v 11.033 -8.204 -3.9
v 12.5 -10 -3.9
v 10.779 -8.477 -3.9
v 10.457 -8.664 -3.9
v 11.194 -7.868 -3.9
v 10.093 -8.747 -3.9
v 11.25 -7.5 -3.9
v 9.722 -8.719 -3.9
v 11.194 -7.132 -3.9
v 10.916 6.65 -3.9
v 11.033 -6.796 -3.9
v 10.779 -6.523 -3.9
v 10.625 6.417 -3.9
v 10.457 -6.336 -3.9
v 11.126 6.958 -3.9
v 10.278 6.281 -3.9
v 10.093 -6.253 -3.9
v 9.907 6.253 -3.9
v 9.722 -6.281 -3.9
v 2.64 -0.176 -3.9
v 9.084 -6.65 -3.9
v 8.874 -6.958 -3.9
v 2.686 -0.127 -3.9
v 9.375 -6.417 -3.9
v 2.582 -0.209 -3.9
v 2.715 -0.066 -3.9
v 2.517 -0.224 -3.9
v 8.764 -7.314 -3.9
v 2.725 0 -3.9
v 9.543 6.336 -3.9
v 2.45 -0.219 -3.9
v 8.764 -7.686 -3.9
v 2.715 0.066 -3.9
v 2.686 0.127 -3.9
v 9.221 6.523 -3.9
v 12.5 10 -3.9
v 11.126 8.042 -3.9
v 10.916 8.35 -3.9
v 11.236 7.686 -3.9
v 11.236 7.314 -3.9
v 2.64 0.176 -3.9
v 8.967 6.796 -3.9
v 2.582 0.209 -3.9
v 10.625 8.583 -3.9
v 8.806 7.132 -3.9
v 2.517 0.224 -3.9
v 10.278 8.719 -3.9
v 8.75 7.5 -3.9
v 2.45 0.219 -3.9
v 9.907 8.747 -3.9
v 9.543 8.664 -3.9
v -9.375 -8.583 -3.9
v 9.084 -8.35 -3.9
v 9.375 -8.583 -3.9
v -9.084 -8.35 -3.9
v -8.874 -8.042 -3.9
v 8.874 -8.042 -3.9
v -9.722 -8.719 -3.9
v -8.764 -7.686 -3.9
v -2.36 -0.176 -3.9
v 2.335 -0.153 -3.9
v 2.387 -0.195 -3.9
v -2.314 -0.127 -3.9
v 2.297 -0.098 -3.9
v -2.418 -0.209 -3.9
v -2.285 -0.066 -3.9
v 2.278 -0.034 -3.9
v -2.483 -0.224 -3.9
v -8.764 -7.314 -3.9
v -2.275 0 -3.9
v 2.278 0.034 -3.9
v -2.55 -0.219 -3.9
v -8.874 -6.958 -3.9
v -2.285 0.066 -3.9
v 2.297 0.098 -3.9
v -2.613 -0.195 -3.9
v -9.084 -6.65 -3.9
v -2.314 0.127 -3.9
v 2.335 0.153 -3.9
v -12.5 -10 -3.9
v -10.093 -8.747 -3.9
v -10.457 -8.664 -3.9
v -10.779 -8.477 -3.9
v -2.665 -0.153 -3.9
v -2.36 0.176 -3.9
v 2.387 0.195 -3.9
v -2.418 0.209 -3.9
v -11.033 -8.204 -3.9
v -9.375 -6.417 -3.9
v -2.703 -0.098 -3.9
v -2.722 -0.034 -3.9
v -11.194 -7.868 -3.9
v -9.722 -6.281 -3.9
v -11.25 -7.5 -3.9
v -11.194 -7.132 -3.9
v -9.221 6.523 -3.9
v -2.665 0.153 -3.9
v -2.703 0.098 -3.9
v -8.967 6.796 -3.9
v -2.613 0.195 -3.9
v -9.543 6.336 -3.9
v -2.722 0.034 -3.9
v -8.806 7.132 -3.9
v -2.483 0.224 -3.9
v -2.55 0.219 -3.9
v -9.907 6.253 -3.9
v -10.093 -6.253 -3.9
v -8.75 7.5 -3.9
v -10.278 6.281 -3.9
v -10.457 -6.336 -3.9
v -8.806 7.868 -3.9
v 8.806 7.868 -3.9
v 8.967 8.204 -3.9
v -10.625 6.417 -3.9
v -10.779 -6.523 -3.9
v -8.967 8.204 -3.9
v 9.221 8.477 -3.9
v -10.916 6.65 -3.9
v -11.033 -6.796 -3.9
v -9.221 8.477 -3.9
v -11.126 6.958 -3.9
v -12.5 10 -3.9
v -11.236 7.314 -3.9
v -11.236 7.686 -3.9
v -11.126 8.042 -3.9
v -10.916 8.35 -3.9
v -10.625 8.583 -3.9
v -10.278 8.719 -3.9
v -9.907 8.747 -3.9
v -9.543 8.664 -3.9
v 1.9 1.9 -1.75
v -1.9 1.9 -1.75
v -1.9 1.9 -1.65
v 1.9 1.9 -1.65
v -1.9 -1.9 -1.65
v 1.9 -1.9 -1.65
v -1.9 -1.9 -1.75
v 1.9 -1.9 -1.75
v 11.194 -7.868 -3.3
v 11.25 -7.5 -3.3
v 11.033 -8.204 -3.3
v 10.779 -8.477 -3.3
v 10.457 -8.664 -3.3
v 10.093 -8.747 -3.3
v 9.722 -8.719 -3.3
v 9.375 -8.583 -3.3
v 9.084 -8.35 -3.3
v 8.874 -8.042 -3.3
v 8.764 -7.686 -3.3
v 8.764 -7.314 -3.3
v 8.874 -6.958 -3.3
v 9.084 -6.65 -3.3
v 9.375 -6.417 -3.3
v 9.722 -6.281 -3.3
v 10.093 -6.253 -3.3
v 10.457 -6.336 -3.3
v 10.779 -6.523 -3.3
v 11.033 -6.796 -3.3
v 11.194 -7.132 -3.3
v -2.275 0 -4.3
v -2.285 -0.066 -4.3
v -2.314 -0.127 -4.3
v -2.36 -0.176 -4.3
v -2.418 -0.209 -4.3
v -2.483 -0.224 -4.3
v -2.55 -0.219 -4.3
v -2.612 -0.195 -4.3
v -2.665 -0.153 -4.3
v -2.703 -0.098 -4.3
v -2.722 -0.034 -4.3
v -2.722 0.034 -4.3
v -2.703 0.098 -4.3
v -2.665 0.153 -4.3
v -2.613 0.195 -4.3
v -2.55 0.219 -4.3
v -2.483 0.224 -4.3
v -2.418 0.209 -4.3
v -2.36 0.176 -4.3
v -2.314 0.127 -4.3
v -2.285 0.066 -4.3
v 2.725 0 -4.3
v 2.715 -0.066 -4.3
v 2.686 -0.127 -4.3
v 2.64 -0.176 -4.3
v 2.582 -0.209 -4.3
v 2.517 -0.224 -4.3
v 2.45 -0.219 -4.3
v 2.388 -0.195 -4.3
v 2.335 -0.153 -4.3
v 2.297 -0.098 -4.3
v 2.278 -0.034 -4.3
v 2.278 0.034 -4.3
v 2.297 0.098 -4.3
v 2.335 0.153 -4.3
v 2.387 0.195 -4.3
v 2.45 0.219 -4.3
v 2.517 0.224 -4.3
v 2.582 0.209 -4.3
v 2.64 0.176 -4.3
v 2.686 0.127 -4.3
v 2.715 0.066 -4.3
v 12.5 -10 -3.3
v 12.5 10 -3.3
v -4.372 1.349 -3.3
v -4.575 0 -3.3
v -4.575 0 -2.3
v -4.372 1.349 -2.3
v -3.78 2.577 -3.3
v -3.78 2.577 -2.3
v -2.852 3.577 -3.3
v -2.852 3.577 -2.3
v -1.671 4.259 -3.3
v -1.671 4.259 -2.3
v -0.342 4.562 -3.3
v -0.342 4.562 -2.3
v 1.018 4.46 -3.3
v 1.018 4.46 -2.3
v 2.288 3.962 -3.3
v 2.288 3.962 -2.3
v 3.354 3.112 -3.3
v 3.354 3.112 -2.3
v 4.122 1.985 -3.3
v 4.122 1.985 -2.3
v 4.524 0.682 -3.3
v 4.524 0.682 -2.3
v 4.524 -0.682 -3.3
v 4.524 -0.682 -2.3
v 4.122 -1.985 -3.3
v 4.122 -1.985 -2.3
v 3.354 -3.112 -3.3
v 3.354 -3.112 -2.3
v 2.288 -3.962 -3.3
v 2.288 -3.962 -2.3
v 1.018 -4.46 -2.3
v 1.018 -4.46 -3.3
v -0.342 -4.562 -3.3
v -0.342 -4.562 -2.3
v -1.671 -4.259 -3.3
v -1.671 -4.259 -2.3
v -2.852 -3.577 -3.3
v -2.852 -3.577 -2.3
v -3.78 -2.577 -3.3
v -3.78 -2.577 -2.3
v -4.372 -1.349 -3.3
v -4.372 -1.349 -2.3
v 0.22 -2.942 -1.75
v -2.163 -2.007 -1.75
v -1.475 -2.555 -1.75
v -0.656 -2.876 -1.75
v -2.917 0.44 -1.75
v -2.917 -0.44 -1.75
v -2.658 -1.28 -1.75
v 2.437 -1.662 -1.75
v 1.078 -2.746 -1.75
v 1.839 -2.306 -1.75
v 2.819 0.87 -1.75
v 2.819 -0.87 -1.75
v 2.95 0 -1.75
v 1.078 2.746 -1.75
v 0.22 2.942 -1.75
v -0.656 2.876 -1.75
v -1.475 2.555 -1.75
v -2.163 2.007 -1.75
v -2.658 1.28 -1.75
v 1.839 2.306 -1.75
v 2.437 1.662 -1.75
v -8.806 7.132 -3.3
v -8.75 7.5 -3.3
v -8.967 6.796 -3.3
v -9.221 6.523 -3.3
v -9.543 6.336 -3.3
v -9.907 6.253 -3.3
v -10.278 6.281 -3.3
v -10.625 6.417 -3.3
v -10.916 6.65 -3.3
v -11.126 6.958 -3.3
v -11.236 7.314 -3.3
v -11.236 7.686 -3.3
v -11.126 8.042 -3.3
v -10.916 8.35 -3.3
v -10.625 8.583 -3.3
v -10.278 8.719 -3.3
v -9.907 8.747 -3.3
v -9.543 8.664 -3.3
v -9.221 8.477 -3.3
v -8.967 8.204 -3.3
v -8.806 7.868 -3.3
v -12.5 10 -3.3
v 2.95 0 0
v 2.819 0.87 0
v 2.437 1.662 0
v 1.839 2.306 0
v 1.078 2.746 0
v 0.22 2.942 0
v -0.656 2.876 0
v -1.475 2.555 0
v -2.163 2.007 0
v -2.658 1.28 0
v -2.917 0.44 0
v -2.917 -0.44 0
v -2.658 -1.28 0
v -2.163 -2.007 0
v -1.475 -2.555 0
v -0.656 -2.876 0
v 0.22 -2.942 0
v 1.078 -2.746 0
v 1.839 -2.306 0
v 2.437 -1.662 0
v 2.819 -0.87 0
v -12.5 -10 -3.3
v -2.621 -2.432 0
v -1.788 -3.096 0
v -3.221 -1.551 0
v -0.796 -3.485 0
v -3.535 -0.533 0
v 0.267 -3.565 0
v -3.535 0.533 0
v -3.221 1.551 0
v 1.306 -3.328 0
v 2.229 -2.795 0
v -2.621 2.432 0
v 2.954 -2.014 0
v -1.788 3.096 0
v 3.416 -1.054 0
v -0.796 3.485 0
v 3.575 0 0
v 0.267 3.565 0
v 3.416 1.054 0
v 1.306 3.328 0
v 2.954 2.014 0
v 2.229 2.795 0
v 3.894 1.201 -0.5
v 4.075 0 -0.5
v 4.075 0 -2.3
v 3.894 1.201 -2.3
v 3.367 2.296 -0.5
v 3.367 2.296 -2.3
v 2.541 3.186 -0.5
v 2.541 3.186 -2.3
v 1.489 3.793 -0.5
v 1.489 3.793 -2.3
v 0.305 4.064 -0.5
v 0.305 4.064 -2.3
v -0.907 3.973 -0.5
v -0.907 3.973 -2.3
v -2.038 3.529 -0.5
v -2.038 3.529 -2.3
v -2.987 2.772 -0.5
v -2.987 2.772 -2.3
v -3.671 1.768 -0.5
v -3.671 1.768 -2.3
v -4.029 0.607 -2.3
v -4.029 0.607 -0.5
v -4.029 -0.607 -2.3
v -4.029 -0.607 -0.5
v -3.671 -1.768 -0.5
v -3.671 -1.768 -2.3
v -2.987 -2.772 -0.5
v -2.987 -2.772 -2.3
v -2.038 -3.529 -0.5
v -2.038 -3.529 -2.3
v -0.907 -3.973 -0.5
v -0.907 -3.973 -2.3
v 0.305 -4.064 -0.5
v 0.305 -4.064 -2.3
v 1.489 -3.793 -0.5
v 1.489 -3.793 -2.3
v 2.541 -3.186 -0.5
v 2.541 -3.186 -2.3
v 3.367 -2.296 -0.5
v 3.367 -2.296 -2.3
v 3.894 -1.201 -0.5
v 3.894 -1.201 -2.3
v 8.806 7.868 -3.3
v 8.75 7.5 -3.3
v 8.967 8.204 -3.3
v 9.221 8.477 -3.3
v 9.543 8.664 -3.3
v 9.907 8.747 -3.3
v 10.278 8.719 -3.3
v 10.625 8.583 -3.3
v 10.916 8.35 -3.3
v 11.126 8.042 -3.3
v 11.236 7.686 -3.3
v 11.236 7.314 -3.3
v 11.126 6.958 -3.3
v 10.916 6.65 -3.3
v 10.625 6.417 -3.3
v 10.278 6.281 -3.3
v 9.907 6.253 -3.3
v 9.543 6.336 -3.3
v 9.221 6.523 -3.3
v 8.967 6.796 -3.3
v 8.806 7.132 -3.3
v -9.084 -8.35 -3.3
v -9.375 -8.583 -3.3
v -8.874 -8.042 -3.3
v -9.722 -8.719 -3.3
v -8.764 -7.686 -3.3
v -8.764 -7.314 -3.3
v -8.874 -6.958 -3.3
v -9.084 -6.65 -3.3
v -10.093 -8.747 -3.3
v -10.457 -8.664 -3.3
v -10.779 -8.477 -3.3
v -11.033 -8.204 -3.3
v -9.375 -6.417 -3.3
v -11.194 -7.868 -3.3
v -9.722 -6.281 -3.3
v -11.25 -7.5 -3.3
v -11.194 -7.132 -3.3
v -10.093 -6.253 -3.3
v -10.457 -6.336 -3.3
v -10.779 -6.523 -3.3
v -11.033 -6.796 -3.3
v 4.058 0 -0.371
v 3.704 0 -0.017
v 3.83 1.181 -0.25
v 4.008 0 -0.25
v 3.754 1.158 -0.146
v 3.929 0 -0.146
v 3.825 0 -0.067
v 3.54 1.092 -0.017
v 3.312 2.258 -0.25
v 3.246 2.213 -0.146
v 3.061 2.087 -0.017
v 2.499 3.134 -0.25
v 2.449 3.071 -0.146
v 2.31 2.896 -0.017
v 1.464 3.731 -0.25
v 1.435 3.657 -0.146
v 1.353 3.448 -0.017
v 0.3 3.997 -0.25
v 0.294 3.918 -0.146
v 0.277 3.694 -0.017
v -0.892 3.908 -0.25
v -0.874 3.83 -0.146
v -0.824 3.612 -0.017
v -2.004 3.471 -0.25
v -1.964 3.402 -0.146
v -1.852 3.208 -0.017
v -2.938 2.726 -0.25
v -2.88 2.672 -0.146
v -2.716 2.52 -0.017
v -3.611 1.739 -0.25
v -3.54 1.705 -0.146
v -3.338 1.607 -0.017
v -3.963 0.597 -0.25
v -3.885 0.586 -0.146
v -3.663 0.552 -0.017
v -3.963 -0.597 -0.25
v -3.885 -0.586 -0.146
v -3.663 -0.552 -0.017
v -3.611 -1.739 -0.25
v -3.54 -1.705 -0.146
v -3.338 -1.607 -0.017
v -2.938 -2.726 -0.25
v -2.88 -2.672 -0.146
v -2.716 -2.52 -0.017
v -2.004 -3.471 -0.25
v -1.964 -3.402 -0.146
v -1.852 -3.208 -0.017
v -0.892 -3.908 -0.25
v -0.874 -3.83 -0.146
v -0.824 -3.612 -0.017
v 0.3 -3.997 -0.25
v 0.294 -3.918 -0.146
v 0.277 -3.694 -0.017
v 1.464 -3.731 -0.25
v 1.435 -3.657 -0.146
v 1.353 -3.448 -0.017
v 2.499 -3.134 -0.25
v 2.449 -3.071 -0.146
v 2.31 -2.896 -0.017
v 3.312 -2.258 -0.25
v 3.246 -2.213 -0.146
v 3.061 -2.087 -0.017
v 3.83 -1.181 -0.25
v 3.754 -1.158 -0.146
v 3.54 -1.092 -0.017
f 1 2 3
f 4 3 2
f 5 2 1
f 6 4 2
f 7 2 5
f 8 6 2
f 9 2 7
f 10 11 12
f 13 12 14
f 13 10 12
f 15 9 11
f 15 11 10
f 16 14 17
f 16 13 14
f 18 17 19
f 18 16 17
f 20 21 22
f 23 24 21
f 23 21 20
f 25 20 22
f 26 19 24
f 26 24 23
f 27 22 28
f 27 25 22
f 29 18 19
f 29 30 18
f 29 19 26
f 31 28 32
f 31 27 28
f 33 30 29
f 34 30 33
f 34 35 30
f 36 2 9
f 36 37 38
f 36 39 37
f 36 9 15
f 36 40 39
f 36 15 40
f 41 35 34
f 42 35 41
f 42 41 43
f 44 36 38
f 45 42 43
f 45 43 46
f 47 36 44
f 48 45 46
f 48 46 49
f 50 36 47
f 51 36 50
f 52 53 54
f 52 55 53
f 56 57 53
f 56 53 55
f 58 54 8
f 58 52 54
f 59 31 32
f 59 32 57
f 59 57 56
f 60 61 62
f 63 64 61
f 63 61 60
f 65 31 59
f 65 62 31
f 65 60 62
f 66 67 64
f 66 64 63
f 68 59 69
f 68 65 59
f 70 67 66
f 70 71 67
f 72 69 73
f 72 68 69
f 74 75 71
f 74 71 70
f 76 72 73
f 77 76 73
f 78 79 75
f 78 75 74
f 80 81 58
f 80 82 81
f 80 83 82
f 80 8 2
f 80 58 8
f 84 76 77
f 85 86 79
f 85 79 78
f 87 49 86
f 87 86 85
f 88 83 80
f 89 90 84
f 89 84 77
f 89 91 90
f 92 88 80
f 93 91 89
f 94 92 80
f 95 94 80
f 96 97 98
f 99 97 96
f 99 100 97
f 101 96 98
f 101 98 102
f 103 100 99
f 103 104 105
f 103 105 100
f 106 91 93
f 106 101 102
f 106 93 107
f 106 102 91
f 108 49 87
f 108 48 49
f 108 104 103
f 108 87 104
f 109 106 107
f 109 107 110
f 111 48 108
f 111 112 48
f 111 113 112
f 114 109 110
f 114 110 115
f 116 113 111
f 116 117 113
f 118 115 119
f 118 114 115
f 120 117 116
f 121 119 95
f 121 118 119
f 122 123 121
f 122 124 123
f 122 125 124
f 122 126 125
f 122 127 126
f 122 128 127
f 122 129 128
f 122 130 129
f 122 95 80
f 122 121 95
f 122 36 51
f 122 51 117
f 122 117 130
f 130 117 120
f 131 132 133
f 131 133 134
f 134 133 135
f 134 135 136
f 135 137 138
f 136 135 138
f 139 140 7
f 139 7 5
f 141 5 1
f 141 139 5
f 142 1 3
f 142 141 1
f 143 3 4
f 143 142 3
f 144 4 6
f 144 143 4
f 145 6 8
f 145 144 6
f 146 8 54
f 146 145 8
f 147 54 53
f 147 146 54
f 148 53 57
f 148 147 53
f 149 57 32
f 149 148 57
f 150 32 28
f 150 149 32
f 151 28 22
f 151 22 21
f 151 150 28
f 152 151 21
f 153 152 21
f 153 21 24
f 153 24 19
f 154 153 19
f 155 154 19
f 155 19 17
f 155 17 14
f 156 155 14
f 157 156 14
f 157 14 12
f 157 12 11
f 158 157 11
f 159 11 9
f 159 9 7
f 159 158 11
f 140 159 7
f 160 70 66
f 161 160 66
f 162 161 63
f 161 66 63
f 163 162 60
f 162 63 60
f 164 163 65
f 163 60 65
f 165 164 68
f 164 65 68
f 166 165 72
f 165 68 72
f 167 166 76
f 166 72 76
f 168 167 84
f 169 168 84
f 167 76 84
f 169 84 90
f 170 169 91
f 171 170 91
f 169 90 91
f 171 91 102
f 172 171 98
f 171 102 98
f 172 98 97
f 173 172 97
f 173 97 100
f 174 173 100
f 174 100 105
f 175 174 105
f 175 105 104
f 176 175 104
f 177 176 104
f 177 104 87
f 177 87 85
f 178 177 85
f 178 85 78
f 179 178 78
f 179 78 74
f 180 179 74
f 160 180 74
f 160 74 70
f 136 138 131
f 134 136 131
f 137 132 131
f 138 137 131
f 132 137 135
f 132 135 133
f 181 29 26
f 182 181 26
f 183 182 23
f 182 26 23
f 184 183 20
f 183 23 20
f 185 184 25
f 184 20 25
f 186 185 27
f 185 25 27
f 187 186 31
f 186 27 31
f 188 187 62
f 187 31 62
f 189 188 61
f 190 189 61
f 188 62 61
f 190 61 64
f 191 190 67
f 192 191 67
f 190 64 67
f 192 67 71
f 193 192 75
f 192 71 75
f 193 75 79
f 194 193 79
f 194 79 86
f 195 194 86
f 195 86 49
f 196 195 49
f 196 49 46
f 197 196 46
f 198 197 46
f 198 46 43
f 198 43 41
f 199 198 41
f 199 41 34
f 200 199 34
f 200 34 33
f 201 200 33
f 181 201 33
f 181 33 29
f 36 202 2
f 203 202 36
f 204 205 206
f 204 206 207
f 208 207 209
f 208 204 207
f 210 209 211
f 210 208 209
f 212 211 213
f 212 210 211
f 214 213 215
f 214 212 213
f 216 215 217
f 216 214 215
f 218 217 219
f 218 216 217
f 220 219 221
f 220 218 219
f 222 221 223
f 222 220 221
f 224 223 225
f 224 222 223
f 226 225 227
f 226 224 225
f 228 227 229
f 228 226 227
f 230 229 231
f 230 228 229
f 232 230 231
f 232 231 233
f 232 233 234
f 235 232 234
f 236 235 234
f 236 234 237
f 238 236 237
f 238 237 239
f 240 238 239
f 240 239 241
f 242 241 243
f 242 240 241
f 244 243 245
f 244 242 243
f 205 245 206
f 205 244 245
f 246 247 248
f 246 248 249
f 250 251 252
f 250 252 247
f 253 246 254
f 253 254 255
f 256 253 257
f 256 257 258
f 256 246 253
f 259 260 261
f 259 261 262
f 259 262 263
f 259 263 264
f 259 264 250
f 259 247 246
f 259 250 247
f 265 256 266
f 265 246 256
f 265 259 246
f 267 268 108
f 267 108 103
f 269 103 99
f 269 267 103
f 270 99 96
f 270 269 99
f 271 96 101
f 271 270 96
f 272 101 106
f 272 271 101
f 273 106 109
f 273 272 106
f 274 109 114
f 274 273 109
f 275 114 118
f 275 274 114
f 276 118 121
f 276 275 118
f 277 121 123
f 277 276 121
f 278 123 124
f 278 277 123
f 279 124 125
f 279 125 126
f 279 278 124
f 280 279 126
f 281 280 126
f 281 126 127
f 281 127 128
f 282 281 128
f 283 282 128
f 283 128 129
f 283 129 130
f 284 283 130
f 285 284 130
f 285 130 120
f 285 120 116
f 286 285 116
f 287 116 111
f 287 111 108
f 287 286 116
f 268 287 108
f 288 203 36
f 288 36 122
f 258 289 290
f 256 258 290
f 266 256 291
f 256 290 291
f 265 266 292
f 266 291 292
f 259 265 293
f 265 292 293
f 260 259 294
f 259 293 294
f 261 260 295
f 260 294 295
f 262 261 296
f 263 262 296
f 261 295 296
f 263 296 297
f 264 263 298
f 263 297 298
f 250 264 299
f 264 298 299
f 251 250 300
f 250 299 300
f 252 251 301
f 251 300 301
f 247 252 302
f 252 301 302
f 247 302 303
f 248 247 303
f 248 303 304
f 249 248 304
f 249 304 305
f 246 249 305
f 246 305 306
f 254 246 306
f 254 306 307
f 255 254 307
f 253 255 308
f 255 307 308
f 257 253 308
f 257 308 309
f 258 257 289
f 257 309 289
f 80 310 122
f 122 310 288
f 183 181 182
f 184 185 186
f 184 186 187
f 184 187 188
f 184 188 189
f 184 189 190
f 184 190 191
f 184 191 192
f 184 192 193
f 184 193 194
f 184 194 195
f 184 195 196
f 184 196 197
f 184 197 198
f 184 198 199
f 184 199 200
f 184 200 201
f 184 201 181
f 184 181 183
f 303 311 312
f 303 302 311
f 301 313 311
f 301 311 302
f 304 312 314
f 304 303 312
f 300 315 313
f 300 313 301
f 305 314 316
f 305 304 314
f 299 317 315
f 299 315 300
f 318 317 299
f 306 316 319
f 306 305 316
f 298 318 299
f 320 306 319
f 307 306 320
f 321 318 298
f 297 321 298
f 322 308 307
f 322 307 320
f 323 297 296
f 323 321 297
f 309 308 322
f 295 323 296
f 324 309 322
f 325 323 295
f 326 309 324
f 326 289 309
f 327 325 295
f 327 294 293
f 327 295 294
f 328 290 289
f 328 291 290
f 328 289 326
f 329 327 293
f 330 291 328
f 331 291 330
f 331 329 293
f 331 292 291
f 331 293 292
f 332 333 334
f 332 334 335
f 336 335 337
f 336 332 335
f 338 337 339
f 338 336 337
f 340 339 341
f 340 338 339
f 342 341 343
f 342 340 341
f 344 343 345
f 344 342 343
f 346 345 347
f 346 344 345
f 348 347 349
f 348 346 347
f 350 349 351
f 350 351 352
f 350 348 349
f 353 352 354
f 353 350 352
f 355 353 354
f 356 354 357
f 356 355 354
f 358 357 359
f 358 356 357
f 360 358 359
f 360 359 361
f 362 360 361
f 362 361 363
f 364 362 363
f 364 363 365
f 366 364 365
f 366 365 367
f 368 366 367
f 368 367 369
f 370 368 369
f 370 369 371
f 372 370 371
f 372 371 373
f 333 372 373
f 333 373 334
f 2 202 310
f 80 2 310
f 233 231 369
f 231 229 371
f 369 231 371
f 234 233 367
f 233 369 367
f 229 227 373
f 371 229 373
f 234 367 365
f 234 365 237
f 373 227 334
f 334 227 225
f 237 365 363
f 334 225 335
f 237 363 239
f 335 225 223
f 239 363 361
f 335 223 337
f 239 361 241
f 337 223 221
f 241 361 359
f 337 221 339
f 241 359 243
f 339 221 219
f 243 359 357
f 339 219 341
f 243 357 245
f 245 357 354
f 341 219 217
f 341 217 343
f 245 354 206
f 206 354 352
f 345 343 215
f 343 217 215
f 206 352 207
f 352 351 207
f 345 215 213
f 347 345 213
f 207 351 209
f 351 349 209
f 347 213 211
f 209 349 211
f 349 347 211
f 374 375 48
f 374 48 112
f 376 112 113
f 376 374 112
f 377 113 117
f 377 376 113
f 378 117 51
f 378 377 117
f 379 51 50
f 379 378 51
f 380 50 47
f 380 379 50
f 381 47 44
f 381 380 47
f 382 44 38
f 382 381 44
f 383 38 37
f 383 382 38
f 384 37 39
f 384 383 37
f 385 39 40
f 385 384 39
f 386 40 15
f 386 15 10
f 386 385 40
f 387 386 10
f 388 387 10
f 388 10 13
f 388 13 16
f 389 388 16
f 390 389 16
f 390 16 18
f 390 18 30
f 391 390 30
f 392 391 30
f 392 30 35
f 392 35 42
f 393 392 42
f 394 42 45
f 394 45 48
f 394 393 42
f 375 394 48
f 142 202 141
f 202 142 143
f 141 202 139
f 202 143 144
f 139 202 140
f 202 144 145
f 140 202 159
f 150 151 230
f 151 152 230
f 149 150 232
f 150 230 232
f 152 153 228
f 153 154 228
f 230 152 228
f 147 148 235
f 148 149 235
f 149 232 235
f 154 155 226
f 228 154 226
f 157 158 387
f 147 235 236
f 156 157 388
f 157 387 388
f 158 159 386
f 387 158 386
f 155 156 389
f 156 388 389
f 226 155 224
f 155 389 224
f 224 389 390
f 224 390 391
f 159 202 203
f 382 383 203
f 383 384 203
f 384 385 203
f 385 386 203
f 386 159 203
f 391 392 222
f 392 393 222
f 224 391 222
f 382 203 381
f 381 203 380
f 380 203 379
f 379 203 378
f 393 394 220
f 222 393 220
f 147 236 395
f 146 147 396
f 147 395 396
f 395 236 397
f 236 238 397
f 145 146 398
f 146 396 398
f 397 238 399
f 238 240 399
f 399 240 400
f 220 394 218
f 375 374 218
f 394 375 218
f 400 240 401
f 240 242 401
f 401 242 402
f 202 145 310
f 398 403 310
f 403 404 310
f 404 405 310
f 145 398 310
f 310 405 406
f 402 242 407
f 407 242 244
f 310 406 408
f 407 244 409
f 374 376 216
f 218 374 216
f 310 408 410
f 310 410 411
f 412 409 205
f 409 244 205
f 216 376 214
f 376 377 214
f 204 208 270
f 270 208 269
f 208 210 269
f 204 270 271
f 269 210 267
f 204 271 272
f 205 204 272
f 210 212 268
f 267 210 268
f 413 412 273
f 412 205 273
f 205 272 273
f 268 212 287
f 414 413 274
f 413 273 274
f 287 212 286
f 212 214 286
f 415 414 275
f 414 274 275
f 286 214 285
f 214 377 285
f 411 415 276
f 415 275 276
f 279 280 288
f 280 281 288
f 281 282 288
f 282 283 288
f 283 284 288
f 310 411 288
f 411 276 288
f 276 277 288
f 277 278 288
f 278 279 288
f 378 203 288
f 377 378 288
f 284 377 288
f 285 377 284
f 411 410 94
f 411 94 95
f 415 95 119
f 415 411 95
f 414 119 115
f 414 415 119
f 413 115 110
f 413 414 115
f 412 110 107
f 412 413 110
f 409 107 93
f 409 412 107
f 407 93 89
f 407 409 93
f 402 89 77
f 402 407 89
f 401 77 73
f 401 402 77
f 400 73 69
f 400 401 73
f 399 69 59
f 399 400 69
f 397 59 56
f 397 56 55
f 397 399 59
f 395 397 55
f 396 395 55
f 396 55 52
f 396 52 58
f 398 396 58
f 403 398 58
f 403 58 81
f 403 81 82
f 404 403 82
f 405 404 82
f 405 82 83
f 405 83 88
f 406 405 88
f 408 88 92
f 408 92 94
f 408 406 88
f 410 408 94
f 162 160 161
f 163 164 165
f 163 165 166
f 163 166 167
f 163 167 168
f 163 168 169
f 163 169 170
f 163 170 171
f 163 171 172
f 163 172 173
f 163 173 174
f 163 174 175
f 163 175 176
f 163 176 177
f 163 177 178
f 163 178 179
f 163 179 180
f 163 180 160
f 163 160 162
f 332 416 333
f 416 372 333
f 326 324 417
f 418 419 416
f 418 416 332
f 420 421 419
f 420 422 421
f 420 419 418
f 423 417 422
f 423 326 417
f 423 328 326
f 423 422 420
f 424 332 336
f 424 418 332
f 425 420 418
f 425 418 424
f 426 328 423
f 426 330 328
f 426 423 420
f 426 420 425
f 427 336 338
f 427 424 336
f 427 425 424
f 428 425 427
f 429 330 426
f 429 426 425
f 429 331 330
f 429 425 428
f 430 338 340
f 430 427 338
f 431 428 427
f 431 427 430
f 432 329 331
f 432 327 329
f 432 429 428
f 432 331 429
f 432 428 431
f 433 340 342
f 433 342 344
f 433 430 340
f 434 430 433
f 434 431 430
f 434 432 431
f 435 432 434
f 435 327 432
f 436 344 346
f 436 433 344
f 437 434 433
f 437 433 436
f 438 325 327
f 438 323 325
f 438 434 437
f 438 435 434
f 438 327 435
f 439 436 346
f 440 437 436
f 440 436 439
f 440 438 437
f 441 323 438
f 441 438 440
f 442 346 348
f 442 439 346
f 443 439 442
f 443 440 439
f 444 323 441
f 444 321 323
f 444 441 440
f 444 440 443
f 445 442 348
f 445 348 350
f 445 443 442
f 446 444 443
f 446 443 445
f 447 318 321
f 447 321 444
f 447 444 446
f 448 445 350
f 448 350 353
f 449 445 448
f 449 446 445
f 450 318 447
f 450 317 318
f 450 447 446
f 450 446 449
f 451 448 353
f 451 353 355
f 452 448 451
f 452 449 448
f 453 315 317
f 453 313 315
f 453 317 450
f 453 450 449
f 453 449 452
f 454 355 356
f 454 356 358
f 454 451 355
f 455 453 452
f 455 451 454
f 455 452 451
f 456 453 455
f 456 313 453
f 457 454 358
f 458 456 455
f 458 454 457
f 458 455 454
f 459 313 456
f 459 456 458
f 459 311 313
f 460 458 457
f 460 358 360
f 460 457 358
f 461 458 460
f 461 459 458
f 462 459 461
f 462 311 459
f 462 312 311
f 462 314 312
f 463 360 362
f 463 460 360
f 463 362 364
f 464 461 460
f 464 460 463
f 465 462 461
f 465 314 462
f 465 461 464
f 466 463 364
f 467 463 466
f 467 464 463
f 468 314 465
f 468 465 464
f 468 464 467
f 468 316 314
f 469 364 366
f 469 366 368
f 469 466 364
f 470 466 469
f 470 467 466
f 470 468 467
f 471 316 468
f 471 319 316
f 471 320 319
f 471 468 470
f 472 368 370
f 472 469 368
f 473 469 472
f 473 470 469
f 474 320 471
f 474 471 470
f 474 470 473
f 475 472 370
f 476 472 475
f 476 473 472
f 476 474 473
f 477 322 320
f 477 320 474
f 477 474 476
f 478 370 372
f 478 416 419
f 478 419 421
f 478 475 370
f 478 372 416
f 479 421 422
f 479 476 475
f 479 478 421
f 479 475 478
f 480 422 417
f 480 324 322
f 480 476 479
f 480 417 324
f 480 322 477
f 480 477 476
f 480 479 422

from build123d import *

# Parameters (mm, degrees)
SKETCH1_R           = 4.075
BOSS_EXTRUDE1_DEPTH = 3.3
SKETCH2_R           = 4.575
BOSS_EXTRUDE2_DEPTH = 1
SKETCH3_R           = 2.95
CUT_EXTRUDE1_DEPTH  = 1.75
FILLET1_R           = 0.5
SKETCH5_R           = 0.225
BOSS_EXTRUDE4_DEPTH = 1
SKETCH6_W           = 25
SKETCH6_H           = 20
SKETCH6_R           = 1.25
BOSS_EXTRUDE5_DEPTH = 0.6
ACTIVE_AREA_START   = 1.55
SKETCH7_W           = 3.8
SKETCH7_H           = 3.8
ACTIVE_AREA_DEPTH   = 0.1


with BuildPart() as part:
    # Sketch1 → Boss-Extrude1 (new body)
    with BuildSketch(Plane.XY):
        Circle(SKETCH1_R)
    extrude(amount=-BOSS_EXTRUDE1_DEPTH)

    # Sketch2 → Boss-Extrude2 (add)
    with BuildSketch(Plane(origin=(0, 0, -3.3), x_dir=(-1, 0, 0), z_dir=(0, 0, -1))):
        Circle(SKETCH2_R)
    extrude(amount=-BOSS_EXTRUDE2_DEPTH)

    # Sketch3 → Cut-Extrude1 (cut)
    with BuildSketch(Plane.XY):
        Circle(SKETCH3_R)
    extrude(amount=-CUT_EXTRUDE1_DEPTH, mode=Mode.SUBTRACT)

    # Fillet1
    fillet1_edges = [part.edges().sort_by_distance(p)[0] for p in [
        (-4.075, 0, 0),
    ]]
    fillet(fillet1_edges, radius=FILLET1_R)

    # Sketch5 → Boss-Extrude4 (add)
    with BuildSketch(Plane(origin=(0, 0, -3.3), x_dir=(-1, 0, 0), z_dir=(0, 0, -1))):
        with Locations(Location((2.5, 0, 0), (0, 0, 180))):
            Circle(SKETCH5_R)
        with Locations(Location((-2.5, 0, 0), (0, 0, 180))):
            Circle(SKETCH5_R)
    extrude(amount=BOSS_EXTRUDE4_DEPTH)

    # Sketch6 → Boss-Extrude5 (add)
    with BuildSketch(Plane(origin=(0, 0, -3.3), x_dir=(-1, 0, 0), z_dir=(0, 0, -1))):
        Rectangle(SKETCH6_W, SKETCH6_H)
        with Locations((10, -7.5)):
            Circle(SKETCH6_R, mode=Mode.SUBTRACT)
        with Locations(Location((10, 7.5, 0), (0, 0, 180))):
            Circle(SKETCH6_R, mode=Mode.SUBTRACT)
        with Locations((-10, 7.5)):
            Circle(SKETCH6_R, mode=Mode.SUBTRACT)
        with Locations(Location((-10, -7.5, 0), (0, 0, 180))):
            Circle(SKETCH6_R, mode=Mode.SUBTRACT)
    extrude(amount=BOSS_EXTRUDE5_DEPTH)


with BuildPart() as body_2:
    # Sketch7 → Active_area (new body)
    with BuildSketch(Plane.XY.offset(-3.3).offset(ACTIVE_AREA_START)):
        Rectangle(SKETCH7_W, SKETCH7_H)
    extrude(amount=ACTIVE_AREA_DEPTH)


solid = Compound([part.part, body_2.part])
